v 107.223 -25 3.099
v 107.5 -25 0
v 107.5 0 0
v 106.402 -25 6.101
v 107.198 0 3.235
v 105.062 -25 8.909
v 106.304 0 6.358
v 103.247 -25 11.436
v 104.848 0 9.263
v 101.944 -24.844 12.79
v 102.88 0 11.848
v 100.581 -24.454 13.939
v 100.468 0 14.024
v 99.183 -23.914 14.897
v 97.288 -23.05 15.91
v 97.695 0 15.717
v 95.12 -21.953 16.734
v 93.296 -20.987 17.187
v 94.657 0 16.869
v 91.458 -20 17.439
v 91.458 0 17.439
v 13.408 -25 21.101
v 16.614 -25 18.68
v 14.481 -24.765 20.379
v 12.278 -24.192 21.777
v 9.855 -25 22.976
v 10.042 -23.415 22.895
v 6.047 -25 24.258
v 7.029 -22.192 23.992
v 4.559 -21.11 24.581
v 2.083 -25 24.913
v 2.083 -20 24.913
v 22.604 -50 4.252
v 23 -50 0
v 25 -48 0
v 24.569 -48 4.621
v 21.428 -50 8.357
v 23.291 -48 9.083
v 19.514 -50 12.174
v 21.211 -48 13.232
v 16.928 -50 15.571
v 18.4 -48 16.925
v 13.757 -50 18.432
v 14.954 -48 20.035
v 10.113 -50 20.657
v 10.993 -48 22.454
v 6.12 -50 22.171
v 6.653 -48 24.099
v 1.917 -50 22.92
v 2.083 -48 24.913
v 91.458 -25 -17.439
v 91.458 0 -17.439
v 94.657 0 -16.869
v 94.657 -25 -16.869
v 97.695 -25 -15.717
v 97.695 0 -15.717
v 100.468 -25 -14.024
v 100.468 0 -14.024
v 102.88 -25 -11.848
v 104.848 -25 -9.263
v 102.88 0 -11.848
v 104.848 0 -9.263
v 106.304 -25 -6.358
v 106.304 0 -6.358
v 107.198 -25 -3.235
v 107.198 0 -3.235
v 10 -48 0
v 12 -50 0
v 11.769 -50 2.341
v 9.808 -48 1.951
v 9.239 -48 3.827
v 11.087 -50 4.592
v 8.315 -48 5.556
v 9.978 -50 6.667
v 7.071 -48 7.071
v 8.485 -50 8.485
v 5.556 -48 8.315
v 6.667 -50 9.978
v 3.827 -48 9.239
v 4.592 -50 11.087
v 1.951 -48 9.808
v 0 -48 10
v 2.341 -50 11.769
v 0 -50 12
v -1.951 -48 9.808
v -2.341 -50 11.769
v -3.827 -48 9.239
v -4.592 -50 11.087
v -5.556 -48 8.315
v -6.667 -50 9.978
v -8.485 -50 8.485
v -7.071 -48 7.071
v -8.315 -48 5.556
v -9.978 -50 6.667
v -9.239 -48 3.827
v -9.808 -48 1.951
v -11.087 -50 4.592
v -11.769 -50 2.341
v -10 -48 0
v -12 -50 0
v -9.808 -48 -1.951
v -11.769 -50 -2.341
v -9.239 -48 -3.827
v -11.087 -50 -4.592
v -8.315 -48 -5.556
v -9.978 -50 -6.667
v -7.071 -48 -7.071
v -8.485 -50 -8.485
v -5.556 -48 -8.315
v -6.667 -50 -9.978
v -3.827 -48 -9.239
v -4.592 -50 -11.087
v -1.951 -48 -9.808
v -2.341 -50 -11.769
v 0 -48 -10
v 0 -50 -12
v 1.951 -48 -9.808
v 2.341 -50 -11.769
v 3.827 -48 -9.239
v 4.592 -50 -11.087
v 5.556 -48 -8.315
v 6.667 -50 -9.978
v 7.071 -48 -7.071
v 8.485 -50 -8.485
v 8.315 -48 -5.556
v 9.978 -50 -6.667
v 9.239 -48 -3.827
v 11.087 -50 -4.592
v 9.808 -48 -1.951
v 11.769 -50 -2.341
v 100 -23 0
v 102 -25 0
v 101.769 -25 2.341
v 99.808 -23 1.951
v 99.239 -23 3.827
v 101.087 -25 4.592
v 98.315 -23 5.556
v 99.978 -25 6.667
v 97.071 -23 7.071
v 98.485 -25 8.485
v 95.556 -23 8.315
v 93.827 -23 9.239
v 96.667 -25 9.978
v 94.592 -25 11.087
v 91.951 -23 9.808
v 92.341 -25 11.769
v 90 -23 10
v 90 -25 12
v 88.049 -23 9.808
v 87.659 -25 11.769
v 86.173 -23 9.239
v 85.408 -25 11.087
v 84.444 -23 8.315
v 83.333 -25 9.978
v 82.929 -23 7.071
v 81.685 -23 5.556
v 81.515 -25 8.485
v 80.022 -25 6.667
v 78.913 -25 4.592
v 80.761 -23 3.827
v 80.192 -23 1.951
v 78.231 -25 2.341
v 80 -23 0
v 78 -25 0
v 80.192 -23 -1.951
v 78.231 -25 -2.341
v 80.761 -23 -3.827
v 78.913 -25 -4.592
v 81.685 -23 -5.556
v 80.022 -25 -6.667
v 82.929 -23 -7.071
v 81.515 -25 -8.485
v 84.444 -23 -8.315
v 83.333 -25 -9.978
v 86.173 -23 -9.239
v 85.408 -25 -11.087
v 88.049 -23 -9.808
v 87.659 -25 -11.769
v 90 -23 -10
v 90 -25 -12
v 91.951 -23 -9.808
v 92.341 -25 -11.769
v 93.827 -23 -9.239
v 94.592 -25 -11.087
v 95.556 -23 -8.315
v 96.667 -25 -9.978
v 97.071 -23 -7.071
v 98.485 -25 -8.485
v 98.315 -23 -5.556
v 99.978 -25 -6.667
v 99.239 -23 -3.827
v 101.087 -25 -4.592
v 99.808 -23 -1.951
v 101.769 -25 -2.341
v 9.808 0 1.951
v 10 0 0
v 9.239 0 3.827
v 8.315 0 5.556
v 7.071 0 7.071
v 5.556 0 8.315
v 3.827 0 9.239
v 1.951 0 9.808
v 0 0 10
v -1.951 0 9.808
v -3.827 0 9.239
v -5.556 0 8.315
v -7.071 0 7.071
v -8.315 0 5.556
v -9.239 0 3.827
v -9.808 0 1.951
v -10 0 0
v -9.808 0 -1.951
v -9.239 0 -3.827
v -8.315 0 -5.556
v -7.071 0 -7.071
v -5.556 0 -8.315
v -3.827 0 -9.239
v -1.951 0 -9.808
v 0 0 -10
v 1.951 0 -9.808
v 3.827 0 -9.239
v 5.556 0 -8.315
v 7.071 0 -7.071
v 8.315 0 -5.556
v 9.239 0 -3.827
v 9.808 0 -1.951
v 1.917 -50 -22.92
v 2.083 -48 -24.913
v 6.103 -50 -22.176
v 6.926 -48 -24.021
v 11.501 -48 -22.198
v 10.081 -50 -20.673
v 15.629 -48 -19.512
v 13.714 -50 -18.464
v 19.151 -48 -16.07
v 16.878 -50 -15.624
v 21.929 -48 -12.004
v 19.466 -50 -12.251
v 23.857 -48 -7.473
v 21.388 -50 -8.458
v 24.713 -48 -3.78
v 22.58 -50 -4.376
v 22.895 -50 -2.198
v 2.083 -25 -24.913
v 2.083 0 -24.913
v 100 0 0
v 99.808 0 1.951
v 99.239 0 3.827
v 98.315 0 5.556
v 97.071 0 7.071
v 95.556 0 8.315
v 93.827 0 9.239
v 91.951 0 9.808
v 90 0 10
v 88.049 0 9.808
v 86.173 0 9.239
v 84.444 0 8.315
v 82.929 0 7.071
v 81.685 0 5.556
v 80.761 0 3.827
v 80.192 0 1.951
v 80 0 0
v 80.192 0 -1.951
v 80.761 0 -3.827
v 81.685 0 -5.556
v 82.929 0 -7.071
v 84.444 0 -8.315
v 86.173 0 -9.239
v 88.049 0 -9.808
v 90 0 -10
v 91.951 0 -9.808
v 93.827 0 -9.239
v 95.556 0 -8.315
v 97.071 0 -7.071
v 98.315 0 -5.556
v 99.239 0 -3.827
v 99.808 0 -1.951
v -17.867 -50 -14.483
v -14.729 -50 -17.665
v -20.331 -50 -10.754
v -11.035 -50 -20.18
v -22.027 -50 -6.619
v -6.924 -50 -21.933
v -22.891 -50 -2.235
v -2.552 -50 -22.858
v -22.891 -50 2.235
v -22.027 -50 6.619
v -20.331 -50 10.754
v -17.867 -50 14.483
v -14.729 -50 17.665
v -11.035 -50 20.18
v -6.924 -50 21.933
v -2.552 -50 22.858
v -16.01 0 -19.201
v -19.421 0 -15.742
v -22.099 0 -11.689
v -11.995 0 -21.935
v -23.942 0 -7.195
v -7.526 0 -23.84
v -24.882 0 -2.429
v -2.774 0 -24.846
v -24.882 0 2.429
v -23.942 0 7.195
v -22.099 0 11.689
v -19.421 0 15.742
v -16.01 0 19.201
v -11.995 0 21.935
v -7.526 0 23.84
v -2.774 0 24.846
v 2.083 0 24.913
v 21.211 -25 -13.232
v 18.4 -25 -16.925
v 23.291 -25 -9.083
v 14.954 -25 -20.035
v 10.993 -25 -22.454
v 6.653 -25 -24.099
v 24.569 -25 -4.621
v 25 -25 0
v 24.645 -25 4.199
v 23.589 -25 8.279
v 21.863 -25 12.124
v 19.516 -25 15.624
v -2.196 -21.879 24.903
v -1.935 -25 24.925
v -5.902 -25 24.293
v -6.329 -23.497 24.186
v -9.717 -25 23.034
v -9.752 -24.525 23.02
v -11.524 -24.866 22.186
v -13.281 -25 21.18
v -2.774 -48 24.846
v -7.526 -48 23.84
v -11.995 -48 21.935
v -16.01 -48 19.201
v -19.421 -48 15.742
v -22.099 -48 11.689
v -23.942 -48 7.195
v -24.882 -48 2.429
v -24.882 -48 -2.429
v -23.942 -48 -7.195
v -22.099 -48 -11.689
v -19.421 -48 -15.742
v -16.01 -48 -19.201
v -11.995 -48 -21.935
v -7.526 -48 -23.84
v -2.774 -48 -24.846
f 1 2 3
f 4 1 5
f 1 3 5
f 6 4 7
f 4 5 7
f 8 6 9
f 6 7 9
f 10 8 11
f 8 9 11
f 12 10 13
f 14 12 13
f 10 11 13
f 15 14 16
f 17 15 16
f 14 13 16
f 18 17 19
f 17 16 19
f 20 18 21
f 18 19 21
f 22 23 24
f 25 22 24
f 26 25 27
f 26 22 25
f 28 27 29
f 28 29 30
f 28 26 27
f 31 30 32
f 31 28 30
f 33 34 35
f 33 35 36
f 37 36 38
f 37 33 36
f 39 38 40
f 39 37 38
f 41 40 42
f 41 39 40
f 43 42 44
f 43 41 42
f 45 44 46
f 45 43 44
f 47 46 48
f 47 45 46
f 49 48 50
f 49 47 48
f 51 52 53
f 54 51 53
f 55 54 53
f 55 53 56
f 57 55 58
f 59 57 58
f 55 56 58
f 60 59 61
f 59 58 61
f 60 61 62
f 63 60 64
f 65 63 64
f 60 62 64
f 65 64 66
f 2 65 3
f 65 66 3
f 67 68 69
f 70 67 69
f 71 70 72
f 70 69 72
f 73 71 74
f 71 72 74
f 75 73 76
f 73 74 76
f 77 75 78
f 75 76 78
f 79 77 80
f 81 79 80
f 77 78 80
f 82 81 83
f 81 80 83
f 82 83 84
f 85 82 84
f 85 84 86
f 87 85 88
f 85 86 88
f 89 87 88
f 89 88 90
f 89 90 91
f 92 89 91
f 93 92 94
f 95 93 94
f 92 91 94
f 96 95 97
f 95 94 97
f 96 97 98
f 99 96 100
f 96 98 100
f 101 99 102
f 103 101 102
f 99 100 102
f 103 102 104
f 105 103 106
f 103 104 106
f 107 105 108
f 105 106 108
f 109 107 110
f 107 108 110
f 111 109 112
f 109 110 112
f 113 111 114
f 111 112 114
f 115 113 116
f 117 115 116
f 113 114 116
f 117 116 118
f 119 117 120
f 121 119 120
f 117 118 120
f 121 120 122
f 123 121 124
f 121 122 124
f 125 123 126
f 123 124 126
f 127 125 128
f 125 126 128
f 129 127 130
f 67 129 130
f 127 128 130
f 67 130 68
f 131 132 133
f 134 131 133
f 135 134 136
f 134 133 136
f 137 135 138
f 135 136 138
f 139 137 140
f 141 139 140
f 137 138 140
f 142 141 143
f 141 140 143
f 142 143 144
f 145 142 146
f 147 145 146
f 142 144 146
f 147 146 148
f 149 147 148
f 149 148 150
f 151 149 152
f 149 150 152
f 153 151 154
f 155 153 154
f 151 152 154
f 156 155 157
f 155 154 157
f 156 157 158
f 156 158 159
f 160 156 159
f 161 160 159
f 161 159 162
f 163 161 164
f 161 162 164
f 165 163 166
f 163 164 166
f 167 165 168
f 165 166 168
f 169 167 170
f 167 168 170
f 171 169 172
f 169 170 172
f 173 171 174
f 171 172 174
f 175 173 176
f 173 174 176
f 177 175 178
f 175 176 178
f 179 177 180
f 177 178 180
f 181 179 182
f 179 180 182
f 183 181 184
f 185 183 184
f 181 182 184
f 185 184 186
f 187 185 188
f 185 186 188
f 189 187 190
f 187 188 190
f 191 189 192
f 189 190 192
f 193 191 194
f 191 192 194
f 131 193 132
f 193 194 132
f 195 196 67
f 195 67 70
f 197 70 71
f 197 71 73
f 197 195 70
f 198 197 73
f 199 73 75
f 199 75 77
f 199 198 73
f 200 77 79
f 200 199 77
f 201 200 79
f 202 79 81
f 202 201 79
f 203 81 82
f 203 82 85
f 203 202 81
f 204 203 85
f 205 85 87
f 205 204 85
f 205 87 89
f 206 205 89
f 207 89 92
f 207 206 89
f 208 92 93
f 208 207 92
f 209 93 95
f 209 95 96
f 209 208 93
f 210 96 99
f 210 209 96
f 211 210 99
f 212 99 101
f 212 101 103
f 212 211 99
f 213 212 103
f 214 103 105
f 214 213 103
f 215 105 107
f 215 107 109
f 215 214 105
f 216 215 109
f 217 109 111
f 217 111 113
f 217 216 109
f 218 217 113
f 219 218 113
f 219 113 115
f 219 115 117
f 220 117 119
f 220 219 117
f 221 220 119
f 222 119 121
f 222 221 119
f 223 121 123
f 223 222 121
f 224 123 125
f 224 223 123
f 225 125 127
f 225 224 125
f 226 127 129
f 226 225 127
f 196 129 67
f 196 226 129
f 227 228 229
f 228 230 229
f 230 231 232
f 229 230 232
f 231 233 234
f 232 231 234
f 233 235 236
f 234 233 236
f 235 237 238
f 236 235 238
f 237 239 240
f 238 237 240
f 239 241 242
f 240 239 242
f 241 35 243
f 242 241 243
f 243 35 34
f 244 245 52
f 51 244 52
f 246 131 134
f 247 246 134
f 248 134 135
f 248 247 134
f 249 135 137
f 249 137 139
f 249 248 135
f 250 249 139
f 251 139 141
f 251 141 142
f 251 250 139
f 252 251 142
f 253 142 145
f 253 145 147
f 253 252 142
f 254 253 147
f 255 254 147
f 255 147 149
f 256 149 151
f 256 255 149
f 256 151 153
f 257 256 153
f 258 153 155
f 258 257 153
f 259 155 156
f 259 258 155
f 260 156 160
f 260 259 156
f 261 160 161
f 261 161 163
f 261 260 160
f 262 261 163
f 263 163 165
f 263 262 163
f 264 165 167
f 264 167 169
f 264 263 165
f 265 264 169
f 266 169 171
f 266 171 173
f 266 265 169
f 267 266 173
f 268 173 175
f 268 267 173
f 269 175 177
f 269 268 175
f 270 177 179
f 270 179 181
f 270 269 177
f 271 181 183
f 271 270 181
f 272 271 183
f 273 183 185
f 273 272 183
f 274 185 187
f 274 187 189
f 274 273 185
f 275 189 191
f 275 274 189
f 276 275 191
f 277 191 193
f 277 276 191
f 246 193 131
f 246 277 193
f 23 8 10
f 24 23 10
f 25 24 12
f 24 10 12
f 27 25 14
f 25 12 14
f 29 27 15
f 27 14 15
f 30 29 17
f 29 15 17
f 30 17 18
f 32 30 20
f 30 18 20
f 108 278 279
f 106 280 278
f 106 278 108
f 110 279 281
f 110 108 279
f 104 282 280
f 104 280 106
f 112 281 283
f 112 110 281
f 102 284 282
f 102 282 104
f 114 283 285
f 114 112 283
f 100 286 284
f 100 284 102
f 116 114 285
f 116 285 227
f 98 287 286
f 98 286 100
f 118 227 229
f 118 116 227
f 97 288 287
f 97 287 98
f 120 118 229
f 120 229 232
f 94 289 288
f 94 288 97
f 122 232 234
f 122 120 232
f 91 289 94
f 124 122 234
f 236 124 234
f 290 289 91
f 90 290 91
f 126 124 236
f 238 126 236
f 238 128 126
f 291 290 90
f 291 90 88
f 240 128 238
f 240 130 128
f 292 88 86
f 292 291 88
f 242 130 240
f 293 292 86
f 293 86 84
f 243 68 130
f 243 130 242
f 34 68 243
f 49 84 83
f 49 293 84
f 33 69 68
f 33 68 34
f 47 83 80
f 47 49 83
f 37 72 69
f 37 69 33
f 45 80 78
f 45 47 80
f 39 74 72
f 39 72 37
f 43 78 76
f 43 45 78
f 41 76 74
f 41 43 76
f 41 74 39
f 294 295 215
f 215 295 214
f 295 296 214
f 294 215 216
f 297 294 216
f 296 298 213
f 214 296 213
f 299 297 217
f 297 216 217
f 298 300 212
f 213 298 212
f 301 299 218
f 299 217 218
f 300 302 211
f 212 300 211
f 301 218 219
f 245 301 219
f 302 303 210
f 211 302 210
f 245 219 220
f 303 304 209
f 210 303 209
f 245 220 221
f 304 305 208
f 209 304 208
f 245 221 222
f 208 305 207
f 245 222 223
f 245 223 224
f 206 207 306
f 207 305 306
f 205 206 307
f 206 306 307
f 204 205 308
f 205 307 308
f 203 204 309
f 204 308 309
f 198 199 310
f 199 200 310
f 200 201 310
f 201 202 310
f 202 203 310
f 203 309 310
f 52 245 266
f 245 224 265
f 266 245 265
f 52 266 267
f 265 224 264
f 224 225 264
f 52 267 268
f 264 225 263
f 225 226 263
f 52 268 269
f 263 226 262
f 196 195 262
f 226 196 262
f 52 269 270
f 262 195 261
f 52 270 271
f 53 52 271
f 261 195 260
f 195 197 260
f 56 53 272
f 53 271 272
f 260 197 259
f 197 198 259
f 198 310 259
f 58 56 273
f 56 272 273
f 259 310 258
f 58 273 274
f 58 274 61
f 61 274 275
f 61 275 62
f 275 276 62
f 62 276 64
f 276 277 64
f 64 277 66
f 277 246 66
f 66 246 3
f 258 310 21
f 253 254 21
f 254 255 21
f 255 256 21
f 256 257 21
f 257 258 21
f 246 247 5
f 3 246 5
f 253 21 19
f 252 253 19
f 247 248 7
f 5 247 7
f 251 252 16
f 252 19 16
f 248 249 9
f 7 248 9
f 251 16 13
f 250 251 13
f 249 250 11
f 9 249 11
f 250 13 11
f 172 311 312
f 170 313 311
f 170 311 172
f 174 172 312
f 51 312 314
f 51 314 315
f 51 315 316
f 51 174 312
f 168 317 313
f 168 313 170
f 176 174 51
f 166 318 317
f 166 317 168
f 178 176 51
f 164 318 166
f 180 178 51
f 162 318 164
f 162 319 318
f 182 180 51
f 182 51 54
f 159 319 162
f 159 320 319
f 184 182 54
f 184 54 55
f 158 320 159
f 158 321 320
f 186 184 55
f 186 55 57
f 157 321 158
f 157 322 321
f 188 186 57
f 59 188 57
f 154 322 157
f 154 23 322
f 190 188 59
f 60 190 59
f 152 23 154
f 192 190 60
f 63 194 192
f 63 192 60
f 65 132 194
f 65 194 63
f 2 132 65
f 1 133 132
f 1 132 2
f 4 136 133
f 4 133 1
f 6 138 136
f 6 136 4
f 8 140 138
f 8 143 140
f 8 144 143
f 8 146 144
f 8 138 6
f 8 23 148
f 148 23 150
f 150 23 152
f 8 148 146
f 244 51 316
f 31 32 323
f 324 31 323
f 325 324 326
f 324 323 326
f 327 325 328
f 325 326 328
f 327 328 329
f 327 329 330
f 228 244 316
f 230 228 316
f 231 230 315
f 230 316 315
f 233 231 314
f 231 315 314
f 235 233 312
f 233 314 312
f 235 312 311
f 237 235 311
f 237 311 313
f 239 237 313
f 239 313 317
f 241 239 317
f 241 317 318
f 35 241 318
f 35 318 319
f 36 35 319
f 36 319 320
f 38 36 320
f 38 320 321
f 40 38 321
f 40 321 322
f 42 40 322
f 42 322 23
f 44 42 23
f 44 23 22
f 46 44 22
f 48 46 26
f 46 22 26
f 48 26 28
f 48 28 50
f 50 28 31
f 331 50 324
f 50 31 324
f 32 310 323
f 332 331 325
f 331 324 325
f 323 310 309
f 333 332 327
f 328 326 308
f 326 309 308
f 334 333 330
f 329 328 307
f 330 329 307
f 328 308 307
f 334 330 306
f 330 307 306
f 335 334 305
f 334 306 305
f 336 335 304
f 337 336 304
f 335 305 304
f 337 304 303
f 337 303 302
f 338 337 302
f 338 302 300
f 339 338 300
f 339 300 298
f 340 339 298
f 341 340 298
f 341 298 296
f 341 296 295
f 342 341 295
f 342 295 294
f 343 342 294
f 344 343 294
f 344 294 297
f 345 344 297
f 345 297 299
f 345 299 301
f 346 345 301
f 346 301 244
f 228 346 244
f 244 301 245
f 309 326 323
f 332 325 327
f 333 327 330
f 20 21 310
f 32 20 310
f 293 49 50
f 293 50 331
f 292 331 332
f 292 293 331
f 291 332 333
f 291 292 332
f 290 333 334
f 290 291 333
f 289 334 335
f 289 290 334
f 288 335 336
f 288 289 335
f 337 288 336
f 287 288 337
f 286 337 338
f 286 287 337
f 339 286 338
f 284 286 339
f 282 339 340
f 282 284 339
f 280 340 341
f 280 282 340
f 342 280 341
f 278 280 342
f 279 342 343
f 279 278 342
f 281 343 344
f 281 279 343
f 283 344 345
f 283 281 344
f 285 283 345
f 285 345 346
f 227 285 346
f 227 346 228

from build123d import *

# Parameters (mm, degrees)
F0_R        = 10
F1_DEPTH    = 25
F2_DEPTH    = 50
F3_SIZE     = 2
F4_T4_DEPTH = 123.4369555733
F4_S5_R     = 25
F4_T6_DEPTH = 64


# Not quite as in the source:
# - a fillet or chamfer that OpenCascade refuses, or shapes differently, is made with other operations: its cross-section is extruded or revolved along the edge and cut away or added


with BuildPart() as f1:
    # F0 (on Front) → F1 (new body)
    with BuildSketch(Plane.XZ):
        with BuildLine():
            ThreePointArc((2.0833333333, -24.9130432148), (18.3995018048, -16.9250800097), (25, 0))
            ThreePointArc((25, 0), (18.3995018048, 16.9250800097), (2.0833333333, 24.9130432148))
            ThreePointArc((2.0833333333, 24.9130432148), (-25, 0), (2.0833333333, -24.9130432148))
        make_face()
        Circle(F0_R, mode=Mode.SUBTRACT)
        with BuildLine():
            ThreePointArc((2.0833333333, 24.9130432148), (18.3995018048, 16.9250800097), (25, 0))
            ThreePointArc((25, 0), (18.3995018048, -16.9250800097), (2.0833333333, -24.9130432148))
            Line((2.0833333333, -24.9130432148), (91.4583333333, -17.4391302504))
            ThreePointArc((91.4583333333, -17.4391302504), (72.5, 0), (91.4583333333, 17.4391302504))
            Line((91.4583333333, 17.4391302504), (2.0833333333, 24.9130432148))
        make_face()
        with BuildLine():
            ThreePointArc((107.5, 0), (102.8796512634, 11.8475560068), (91.4583333333, 17.4391302504))
            ThreePointArc((91.4583333333, 17.4391302504), (72.5, 0), (91.4583333333, -17.4391302504))
            ThreePointArc((91.4583333333, -17.4391302504), (102.8796512634, -11.8475560068), (107.5, 0))
        make_face()
        with Locations((90, 0)):
            Circle(F0_R, mode=Mode.SUBTRACT)
    extrude(amount=F1_DEPTH)

    # F0 (on Front) → F2 (join)
    with BuildSketch(Plane.XZ):
        with BuildLine():
            ThreePointArc((2.0833333333, -24.9130432148), (18.3995018048, -16.9250800097), (25, 0))
            ThreePointArc((25, 0), (18.3995018048, 16.9250800097), (2.0833333333, 24.9130432148))
            ThreePointArc((2.0833333333, 24.9130432148), (-25, 0), (2.0833333333, -24.9130432148))
        make_face()
        Circle(F0_R, mode=Mode.SUBTRACT)
    extrude(amount=F2_DEPTH)

    # F3
    f3_edges = [f1.edges().sort_by_distance(p)[0] for p in [
        (-2.083333, -50, 24.913043),
        (-10, -50, 0),
        (80, -25, 0),
    ]]
    chamfer(f3_edges, length=F3_SIZE)

    # F4: fillet of radius 5 on 1 edges, made by hand


with BuildPart() as f4_tool2:
    # F4_s3 → F4_t4 (new body)
    with BuildSketch(Plane(origin=(101.8315216074, 0, -8.5155796311), x_dir=(0, 1, 0), z_dir=(-0.9965217286, 0, 0.0833333333))):
        with BuildLine():
            ThreePointArc((-25, -20), (-23.5355339059, -23.5355339059), (-20, -25))
            Line((-20, -25), (-25, -25))
            Line((-25, -25), (-25, -20))
        make_face()
    extrude(amount=F4_T4_DEPTH)

    # F4_s5 → F4_t6 (cut, symmetric)
    with BuildSketch(Plane.XZ.offset(22.5)):
        Circle(F4_S5_R)
    extrude(amount=F4_T6_DEPTH, both=True, mode=Mode.SUBTRACT)


with BuildPart() as f1_1:
    add(f1.part)

    # F4_t1: cut F4_tool2
    add(f4_tool2.part, mode=Mode.SUBTRACT)


solid = f1_1.part
